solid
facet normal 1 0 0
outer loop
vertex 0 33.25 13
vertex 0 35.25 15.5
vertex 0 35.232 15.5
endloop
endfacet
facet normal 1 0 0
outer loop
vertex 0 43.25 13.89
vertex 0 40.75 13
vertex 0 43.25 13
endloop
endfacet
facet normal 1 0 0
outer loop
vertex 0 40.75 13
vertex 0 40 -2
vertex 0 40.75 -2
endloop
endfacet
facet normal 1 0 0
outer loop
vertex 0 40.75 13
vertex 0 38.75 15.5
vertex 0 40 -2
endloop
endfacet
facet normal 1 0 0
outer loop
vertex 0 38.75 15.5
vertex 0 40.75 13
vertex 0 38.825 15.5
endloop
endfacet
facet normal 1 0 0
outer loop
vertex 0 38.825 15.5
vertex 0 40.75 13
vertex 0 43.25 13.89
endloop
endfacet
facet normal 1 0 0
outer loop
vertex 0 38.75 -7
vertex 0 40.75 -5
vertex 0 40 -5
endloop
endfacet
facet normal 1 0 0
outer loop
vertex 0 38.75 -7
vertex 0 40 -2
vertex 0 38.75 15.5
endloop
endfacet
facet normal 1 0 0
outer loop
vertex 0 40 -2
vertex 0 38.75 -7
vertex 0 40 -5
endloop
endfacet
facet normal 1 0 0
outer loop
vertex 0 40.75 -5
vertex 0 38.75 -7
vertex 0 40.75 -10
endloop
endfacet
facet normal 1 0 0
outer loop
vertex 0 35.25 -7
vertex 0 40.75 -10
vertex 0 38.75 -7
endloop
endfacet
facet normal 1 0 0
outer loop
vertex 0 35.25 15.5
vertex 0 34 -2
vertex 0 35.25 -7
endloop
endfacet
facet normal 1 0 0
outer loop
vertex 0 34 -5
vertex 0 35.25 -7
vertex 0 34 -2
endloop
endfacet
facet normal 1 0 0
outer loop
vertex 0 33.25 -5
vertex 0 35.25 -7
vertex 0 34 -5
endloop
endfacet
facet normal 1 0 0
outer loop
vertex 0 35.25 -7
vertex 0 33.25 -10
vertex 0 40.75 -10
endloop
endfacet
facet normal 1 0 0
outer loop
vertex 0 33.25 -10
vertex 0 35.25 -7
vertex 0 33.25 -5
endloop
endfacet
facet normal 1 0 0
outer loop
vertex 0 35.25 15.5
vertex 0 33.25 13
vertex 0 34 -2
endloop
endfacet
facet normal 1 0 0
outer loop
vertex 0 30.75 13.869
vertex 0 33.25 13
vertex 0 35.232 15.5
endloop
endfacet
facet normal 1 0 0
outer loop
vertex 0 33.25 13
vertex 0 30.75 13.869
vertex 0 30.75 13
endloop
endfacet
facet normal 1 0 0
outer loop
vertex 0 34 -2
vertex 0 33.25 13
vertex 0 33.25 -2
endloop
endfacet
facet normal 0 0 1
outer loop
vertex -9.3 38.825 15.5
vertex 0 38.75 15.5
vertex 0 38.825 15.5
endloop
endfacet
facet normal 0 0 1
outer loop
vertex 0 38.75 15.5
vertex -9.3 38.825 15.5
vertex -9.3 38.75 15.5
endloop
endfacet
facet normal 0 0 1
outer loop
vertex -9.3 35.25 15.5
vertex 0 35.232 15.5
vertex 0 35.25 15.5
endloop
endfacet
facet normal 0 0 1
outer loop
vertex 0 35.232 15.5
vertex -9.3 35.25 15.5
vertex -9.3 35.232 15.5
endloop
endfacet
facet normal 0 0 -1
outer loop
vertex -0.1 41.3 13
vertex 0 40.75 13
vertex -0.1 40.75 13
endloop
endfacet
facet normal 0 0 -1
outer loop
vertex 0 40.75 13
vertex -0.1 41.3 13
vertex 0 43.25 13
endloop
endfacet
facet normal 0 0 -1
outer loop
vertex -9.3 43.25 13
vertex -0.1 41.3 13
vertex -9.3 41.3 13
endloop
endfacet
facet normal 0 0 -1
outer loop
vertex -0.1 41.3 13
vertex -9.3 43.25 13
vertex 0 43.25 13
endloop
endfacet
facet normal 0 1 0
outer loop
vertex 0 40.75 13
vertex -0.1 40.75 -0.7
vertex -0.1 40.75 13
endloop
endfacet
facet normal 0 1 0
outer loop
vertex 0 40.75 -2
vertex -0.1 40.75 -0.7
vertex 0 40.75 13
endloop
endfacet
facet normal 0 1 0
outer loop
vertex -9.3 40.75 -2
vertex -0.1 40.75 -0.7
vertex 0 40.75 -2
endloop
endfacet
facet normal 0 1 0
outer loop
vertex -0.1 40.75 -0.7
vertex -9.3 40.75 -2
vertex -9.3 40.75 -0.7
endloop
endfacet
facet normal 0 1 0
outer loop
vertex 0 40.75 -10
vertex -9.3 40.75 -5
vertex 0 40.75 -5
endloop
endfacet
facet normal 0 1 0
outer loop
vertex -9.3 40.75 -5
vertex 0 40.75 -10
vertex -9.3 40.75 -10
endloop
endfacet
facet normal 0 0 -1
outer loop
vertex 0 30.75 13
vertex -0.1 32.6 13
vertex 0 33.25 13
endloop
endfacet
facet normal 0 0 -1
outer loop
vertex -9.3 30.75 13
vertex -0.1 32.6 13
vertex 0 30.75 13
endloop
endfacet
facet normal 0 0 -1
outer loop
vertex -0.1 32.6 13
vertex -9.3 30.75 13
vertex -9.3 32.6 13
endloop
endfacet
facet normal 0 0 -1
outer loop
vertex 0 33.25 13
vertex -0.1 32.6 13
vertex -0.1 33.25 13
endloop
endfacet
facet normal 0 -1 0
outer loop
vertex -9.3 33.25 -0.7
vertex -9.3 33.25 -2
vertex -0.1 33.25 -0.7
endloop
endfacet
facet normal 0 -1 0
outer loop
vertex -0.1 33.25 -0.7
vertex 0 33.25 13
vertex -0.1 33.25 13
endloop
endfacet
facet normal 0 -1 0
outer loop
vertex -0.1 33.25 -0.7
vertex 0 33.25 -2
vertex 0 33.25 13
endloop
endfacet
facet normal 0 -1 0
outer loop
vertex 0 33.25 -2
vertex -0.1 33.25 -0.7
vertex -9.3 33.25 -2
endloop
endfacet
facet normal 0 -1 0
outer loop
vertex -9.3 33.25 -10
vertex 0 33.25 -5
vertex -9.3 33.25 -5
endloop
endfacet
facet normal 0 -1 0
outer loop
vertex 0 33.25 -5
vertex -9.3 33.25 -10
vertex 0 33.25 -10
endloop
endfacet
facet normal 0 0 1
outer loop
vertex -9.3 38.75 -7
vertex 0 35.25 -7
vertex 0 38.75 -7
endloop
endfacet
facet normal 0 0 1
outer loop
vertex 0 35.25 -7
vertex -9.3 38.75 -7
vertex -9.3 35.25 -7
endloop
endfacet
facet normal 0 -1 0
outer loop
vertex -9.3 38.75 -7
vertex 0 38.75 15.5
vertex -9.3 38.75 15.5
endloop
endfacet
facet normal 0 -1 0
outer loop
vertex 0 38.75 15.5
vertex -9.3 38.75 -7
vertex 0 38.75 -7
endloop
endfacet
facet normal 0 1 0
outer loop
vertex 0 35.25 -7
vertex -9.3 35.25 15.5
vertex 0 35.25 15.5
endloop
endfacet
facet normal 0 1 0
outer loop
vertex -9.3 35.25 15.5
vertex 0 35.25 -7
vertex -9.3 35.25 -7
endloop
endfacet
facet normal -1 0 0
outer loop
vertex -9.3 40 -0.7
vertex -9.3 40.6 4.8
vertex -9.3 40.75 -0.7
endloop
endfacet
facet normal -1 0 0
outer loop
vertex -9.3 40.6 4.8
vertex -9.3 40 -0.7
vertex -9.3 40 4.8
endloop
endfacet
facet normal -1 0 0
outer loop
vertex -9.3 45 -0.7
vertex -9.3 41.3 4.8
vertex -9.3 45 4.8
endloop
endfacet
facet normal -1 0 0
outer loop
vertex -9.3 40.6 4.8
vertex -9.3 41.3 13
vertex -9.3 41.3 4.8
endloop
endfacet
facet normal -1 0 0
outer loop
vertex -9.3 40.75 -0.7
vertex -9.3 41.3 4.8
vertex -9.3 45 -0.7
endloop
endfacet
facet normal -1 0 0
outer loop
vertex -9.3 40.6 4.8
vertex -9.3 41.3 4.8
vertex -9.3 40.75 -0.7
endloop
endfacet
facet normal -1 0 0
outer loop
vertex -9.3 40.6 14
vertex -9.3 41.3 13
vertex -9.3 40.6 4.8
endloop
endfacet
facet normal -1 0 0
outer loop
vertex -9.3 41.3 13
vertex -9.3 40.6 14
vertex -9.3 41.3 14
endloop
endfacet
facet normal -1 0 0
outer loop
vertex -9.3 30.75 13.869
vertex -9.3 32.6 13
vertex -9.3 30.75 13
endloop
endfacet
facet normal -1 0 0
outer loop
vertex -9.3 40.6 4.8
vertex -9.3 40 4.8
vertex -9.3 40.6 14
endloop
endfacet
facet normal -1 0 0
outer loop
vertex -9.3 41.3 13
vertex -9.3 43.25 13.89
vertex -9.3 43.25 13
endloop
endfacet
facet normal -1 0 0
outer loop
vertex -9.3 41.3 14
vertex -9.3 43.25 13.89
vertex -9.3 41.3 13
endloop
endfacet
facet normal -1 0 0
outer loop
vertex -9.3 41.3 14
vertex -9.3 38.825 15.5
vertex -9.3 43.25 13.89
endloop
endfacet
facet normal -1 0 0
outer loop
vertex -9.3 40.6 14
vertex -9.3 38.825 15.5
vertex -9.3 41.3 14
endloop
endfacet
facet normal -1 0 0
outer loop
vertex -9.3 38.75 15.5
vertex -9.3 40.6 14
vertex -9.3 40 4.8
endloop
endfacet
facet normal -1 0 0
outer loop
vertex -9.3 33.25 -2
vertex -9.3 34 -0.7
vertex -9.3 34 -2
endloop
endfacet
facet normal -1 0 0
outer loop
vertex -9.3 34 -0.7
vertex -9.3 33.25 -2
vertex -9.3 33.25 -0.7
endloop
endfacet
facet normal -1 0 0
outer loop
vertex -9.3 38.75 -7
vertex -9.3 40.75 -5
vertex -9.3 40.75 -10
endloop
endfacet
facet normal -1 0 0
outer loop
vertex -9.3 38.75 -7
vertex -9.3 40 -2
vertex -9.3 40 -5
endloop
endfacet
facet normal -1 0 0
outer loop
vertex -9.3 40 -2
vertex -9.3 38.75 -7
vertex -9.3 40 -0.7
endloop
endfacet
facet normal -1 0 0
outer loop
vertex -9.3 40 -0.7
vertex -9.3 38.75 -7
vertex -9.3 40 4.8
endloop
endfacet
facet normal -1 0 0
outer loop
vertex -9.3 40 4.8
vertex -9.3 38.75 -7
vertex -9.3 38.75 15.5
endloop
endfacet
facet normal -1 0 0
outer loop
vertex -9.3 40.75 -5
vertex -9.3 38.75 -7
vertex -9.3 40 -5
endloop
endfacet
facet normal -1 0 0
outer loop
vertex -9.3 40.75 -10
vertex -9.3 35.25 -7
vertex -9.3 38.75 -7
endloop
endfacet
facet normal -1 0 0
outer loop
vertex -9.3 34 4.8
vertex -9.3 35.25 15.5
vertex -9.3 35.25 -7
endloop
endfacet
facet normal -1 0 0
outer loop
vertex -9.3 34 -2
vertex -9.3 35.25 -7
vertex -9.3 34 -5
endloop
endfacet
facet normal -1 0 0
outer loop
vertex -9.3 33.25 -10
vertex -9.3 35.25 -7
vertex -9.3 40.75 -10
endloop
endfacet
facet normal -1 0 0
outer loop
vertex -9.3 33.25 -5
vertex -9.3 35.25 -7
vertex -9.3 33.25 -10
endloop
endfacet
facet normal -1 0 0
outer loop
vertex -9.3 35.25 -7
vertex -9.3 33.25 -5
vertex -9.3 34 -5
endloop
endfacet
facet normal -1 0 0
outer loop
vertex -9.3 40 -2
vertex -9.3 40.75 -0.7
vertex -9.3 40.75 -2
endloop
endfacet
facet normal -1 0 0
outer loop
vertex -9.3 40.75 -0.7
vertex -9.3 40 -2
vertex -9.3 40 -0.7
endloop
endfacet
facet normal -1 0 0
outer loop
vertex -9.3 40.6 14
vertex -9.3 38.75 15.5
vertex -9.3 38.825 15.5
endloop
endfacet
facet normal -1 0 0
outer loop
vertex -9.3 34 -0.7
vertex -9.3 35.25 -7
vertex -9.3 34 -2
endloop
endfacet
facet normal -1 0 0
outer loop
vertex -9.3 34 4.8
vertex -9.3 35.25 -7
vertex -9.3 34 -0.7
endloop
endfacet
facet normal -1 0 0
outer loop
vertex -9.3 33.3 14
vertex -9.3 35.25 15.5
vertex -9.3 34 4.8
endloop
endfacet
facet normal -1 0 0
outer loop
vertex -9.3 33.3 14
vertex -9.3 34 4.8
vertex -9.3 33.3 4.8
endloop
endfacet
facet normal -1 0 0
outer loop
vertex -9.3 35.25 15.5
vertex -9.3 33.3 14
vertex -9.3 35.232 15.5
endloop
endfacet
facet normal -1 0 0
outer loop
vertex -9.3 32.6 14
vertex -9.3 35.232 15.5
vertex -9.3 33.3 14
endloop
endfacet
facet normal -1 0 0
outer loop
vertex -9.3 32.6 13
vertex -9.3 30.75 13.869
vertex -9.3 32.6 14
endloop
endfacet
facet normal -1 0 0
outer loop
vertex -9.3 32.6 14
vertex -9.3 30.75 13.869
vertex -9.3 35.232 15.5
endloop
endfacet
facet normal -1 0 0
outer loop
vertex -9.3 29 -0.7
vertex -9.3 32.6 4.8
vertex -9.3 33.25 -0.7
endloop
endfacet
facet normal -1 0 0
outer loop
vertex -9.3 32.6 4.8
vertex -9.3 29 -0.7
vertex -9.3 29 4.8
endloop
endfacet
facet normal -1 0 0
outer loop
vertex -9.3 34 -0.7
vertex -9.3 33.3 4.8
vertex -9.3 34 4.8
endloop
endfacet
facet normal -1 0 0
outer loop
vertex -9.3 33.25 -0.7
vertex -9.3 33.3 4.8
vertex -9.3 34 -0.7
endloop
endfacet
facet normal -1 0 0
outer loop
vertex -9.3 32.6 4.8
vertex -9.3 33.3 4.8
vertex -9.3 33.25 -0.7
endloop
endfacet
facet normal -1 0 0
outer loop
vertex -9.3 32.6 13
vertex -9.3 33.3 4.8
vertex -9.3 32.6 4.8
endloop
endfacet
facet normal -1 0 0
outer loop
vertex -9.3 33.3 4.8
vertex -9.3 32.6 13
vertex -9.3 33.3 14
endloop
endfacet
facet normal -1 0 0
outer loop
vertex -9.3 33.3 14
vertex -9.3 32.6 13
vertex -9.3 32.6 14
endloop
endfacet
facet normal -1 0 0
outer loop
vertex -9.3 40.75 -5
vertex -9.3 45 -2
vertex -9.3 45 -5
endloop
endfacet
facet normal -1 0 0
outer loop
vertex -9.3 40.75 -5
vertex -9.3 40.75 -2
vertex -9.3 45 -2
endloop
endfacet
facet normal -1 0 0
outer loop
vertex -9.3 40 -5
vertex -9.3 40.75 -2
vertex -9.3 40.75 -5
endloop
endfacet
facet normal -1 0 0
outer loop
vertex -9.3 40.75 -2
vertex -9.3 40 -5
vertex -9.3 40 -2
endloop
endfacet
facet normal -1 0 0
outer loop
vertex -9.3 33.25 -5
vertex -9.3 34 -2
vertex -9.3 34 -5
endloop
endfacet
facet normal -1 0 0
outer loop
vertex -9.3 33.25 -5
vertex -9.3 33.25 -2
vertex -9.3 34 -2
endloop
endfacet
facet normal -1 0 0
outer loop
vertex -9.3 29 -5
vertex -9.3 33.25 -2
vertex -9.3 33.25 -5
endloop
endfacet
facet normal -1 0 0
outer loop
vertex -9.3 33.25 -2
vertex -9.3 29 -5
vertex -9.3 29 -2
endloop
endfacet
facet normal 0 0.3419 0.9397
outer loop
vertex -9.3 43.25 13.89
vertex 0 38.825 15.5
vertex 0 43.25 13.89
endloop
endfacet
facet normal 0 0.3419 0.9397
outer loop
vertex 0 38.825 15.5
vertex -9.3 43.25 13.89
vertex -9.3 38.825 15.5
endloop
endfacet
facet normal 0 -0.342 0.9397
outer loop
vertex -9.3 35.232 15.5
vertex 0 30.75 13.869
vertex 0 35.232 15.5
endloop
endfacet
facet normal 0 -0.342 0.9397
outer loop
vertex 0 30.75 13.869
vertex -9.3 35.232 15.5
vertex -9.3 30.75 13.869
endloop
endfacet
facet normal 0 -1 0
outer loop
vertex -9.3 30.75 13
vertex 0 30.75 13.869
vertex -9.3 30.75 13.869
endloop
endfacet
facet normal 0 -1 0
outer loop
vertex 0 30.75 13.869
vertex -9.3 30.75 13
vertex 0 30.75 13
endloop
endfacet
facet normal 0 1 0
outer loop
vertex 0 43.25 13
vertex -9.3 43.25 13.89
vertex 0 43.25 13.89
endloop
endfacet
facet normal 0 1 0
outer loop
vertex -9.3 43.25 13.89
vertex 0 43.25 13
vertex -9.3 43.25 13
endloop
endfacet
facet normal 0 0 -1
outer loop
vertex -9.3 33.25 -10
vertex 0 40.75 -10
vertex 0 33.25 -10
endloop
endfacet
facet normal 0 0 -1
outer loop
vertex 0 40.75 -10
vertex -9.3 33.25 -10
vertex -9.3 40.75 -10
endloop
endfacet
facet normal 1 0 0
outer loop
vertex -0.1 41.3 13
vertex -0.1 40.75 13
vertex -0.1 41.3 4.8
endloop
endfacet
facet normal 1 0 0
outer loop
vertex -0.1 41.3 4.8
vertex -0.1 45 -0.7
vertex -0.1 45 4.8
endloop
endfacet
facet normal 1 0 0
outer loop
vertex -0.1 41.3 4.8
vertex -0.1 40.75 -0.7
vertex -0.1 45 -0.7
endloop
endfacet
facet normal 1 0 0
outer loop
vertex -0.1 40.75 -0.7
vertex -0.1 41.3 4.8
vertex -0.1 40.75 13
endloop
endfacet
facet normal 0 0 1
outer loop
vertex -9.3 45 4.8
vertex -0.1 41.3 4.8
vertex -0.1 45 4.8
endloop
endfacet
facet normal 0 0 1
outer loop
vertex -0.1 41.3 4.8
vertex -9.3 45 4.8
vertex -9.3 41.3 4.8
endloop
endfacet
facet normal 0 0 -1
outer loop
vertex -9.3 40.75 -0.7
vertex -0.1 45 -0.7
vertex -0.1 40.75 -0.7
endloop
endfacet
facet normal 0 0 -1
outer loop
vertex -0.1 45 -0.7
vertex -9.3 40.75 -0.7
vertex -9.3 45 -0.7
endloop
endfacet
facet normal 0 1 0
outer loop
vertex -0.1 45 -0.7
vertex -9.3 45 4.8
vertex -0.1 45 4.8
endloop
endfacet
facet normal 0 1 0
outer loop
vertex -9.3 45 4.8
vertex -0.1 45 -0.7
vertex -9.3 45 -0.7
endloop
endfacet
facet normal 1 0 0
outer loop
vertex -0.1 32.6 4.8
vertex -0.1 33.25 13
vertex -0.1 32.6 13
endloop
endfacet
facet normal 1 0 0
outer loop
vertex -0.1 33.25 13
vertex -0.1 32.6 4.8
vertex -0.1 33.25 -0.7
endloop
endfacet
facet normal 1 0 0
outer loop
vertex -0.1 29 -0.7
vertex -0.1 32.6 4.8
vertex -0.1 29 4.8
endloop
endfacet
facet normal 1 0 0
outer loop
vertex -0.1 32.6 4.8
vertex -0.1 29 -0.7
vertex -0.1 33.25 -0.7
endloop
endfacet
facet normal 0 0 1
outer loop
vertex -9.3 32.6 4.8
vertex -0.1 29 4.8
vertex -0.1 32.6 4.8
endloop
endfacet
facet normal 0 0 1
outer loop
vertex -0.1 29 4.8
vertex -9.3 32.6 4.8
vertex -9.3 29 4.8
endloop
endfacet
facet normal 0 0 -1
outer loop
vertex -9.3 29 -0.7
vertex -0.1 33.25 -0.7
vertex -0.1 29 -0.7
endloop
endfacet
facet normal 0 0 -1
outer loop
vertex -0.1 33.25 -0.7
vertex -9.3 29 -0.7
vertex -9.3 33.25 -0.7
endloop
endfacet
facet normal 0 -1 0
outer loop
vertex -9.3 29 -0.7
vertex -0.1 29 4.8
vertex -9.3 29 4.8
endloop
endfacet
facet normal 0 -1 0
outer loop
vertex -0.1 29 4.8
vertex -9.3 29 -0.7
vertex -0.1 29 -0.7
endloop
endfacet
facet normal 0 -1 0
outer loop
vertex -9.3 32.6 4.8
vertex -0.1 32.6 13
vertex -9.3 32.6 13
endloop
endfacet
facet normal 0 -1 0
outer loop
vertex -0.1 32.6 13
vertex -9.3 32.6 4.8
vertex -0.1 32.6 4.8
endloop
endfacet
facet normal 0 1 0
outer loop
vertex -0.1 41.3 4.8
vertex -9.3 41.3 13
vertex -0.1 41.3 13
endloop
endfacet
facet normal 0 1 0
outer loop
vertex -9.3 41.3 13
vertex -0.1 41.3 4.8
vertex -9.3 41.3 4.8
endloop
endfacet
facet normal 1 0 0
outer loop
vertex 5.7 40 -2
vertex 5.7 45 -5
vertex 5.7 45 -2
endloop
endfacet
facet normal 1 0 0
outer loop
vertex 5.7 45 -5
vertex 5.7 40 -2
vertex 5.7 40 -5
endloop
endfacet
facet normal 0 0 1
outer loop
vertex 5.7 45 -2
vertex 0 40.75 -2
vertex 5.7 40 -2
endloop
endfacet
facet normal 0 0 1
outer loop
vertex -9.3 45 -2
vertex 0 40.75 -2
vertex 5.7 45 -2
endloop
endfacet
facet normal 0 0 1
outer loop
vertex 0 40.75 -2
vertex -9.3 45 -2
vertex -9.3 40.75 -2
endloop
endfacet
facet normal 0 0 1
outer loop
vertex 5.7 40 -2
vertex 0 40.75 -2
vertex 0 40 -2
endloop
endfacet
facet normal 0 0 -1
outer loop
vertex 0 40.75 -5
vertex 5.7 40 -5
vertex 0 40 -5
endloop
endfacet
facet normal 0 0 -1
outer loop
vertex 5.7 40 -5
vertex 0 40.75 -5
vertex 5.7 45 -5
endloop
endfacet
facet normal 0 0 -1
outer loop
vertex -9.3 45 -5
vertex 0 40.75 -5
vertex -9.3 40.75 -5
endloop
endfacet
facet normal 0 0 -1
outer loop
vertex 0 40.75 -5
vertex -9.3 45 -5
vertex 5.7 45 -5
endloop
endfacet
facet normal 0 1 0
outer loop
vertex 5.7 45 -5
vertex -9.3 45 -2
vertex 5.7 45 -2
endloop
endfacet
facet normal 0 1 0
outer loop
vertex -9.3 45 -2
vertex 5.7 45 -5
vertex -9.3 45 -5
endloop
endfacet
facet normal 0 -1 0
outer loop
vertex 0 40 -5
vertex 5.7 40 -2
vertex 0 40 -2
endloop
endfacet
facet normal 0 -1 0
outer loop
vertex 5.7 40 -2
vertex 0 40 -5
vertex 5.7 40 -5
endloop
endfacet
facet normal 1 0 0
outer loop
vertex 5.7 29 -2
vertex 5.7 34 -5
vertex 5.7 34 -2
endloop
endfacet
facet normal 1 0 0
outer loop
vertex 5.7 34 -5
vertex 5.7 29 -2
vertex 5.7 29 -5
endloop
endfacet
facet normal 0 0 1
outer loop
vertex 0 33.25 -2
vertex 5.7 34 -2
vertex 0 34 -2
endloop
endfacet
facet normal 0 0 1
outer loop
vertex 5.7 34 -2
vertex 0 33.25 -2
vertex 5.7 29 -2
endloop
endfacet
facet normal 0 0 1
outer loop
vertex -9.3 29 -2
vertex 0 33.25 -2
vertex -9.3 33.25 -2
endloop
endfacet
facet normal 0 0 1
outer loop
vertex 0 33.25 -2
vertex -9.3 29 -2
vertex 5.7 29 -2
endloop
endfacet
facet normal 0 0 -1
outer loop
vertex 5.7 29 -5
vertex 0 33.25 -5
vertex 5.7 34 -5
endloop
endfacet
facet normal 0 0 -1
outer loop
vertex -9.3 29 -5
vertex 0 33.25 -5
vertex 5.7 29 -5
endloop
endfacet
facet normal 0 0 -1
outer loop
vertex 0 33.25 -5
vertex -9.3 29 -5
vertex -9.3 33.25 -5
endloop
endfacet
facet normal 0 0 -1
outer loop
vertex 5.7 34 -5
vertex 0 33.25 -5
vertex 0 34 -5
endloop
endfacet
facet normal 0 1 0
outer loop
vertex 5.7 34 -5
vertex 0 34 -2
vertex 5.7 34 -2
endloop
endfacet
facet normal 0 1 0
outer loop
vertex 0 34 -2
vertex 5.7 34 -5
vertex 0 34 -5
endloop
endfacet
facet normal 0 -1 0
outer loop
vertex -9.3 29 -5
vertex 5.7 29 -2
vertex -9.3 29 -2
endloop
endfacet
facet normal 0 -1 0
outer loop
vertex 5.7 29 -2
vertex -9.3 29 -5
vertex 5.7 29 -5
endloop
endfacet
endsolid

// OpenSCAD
Height=15;
Armlength=5;

translate([40,-0.25,-32])difference(){
translate([-50,27,12.5])cube([10,20,35]);
translate([-50,41,10])cube([10,8,35]);
translate([-50,25.5,10])cube([10,8,35]);
translate([-50,35.5,25])cube([10,3.5,35]);
translate([-50,41.3,25])cube([5,3.5,20]);
translate([-50,45,30])cube([15,3.5,20]);
translate([-50,26,30])cube([15,3.5,20]);
translate([-54.3,28,10])cube([5,20,53]);
rotate([0,20,90])translate([20,35.5,58])cube([20,20,20]);
rotate([0,70,90])translate([-52.5,35.5,35])cube([20,20,20]);
translate([-55,11,30])cube([20,20,20]);
translate([-55,43.5,30])cube([20,20,20]);
translate([-50,27,2])cube([20,20,20]);
}


translate([-9.3,40,-.7])cube([9.2,5,5.5]);
translate([-9.3,29,-.7])cube([9.2,5,5.5]);
translate([-9.3,32.6,4])cube([9.2,.7,10]);
translate([-9.3,40.6,4])cube([9.2,.7,10]);

translate([-9.3,40,Height*-1+10])cube([Armlength+10,5,3]);
translate([-9.3,29,Height*-1+10])cube([Armlength+10,5,3]);
